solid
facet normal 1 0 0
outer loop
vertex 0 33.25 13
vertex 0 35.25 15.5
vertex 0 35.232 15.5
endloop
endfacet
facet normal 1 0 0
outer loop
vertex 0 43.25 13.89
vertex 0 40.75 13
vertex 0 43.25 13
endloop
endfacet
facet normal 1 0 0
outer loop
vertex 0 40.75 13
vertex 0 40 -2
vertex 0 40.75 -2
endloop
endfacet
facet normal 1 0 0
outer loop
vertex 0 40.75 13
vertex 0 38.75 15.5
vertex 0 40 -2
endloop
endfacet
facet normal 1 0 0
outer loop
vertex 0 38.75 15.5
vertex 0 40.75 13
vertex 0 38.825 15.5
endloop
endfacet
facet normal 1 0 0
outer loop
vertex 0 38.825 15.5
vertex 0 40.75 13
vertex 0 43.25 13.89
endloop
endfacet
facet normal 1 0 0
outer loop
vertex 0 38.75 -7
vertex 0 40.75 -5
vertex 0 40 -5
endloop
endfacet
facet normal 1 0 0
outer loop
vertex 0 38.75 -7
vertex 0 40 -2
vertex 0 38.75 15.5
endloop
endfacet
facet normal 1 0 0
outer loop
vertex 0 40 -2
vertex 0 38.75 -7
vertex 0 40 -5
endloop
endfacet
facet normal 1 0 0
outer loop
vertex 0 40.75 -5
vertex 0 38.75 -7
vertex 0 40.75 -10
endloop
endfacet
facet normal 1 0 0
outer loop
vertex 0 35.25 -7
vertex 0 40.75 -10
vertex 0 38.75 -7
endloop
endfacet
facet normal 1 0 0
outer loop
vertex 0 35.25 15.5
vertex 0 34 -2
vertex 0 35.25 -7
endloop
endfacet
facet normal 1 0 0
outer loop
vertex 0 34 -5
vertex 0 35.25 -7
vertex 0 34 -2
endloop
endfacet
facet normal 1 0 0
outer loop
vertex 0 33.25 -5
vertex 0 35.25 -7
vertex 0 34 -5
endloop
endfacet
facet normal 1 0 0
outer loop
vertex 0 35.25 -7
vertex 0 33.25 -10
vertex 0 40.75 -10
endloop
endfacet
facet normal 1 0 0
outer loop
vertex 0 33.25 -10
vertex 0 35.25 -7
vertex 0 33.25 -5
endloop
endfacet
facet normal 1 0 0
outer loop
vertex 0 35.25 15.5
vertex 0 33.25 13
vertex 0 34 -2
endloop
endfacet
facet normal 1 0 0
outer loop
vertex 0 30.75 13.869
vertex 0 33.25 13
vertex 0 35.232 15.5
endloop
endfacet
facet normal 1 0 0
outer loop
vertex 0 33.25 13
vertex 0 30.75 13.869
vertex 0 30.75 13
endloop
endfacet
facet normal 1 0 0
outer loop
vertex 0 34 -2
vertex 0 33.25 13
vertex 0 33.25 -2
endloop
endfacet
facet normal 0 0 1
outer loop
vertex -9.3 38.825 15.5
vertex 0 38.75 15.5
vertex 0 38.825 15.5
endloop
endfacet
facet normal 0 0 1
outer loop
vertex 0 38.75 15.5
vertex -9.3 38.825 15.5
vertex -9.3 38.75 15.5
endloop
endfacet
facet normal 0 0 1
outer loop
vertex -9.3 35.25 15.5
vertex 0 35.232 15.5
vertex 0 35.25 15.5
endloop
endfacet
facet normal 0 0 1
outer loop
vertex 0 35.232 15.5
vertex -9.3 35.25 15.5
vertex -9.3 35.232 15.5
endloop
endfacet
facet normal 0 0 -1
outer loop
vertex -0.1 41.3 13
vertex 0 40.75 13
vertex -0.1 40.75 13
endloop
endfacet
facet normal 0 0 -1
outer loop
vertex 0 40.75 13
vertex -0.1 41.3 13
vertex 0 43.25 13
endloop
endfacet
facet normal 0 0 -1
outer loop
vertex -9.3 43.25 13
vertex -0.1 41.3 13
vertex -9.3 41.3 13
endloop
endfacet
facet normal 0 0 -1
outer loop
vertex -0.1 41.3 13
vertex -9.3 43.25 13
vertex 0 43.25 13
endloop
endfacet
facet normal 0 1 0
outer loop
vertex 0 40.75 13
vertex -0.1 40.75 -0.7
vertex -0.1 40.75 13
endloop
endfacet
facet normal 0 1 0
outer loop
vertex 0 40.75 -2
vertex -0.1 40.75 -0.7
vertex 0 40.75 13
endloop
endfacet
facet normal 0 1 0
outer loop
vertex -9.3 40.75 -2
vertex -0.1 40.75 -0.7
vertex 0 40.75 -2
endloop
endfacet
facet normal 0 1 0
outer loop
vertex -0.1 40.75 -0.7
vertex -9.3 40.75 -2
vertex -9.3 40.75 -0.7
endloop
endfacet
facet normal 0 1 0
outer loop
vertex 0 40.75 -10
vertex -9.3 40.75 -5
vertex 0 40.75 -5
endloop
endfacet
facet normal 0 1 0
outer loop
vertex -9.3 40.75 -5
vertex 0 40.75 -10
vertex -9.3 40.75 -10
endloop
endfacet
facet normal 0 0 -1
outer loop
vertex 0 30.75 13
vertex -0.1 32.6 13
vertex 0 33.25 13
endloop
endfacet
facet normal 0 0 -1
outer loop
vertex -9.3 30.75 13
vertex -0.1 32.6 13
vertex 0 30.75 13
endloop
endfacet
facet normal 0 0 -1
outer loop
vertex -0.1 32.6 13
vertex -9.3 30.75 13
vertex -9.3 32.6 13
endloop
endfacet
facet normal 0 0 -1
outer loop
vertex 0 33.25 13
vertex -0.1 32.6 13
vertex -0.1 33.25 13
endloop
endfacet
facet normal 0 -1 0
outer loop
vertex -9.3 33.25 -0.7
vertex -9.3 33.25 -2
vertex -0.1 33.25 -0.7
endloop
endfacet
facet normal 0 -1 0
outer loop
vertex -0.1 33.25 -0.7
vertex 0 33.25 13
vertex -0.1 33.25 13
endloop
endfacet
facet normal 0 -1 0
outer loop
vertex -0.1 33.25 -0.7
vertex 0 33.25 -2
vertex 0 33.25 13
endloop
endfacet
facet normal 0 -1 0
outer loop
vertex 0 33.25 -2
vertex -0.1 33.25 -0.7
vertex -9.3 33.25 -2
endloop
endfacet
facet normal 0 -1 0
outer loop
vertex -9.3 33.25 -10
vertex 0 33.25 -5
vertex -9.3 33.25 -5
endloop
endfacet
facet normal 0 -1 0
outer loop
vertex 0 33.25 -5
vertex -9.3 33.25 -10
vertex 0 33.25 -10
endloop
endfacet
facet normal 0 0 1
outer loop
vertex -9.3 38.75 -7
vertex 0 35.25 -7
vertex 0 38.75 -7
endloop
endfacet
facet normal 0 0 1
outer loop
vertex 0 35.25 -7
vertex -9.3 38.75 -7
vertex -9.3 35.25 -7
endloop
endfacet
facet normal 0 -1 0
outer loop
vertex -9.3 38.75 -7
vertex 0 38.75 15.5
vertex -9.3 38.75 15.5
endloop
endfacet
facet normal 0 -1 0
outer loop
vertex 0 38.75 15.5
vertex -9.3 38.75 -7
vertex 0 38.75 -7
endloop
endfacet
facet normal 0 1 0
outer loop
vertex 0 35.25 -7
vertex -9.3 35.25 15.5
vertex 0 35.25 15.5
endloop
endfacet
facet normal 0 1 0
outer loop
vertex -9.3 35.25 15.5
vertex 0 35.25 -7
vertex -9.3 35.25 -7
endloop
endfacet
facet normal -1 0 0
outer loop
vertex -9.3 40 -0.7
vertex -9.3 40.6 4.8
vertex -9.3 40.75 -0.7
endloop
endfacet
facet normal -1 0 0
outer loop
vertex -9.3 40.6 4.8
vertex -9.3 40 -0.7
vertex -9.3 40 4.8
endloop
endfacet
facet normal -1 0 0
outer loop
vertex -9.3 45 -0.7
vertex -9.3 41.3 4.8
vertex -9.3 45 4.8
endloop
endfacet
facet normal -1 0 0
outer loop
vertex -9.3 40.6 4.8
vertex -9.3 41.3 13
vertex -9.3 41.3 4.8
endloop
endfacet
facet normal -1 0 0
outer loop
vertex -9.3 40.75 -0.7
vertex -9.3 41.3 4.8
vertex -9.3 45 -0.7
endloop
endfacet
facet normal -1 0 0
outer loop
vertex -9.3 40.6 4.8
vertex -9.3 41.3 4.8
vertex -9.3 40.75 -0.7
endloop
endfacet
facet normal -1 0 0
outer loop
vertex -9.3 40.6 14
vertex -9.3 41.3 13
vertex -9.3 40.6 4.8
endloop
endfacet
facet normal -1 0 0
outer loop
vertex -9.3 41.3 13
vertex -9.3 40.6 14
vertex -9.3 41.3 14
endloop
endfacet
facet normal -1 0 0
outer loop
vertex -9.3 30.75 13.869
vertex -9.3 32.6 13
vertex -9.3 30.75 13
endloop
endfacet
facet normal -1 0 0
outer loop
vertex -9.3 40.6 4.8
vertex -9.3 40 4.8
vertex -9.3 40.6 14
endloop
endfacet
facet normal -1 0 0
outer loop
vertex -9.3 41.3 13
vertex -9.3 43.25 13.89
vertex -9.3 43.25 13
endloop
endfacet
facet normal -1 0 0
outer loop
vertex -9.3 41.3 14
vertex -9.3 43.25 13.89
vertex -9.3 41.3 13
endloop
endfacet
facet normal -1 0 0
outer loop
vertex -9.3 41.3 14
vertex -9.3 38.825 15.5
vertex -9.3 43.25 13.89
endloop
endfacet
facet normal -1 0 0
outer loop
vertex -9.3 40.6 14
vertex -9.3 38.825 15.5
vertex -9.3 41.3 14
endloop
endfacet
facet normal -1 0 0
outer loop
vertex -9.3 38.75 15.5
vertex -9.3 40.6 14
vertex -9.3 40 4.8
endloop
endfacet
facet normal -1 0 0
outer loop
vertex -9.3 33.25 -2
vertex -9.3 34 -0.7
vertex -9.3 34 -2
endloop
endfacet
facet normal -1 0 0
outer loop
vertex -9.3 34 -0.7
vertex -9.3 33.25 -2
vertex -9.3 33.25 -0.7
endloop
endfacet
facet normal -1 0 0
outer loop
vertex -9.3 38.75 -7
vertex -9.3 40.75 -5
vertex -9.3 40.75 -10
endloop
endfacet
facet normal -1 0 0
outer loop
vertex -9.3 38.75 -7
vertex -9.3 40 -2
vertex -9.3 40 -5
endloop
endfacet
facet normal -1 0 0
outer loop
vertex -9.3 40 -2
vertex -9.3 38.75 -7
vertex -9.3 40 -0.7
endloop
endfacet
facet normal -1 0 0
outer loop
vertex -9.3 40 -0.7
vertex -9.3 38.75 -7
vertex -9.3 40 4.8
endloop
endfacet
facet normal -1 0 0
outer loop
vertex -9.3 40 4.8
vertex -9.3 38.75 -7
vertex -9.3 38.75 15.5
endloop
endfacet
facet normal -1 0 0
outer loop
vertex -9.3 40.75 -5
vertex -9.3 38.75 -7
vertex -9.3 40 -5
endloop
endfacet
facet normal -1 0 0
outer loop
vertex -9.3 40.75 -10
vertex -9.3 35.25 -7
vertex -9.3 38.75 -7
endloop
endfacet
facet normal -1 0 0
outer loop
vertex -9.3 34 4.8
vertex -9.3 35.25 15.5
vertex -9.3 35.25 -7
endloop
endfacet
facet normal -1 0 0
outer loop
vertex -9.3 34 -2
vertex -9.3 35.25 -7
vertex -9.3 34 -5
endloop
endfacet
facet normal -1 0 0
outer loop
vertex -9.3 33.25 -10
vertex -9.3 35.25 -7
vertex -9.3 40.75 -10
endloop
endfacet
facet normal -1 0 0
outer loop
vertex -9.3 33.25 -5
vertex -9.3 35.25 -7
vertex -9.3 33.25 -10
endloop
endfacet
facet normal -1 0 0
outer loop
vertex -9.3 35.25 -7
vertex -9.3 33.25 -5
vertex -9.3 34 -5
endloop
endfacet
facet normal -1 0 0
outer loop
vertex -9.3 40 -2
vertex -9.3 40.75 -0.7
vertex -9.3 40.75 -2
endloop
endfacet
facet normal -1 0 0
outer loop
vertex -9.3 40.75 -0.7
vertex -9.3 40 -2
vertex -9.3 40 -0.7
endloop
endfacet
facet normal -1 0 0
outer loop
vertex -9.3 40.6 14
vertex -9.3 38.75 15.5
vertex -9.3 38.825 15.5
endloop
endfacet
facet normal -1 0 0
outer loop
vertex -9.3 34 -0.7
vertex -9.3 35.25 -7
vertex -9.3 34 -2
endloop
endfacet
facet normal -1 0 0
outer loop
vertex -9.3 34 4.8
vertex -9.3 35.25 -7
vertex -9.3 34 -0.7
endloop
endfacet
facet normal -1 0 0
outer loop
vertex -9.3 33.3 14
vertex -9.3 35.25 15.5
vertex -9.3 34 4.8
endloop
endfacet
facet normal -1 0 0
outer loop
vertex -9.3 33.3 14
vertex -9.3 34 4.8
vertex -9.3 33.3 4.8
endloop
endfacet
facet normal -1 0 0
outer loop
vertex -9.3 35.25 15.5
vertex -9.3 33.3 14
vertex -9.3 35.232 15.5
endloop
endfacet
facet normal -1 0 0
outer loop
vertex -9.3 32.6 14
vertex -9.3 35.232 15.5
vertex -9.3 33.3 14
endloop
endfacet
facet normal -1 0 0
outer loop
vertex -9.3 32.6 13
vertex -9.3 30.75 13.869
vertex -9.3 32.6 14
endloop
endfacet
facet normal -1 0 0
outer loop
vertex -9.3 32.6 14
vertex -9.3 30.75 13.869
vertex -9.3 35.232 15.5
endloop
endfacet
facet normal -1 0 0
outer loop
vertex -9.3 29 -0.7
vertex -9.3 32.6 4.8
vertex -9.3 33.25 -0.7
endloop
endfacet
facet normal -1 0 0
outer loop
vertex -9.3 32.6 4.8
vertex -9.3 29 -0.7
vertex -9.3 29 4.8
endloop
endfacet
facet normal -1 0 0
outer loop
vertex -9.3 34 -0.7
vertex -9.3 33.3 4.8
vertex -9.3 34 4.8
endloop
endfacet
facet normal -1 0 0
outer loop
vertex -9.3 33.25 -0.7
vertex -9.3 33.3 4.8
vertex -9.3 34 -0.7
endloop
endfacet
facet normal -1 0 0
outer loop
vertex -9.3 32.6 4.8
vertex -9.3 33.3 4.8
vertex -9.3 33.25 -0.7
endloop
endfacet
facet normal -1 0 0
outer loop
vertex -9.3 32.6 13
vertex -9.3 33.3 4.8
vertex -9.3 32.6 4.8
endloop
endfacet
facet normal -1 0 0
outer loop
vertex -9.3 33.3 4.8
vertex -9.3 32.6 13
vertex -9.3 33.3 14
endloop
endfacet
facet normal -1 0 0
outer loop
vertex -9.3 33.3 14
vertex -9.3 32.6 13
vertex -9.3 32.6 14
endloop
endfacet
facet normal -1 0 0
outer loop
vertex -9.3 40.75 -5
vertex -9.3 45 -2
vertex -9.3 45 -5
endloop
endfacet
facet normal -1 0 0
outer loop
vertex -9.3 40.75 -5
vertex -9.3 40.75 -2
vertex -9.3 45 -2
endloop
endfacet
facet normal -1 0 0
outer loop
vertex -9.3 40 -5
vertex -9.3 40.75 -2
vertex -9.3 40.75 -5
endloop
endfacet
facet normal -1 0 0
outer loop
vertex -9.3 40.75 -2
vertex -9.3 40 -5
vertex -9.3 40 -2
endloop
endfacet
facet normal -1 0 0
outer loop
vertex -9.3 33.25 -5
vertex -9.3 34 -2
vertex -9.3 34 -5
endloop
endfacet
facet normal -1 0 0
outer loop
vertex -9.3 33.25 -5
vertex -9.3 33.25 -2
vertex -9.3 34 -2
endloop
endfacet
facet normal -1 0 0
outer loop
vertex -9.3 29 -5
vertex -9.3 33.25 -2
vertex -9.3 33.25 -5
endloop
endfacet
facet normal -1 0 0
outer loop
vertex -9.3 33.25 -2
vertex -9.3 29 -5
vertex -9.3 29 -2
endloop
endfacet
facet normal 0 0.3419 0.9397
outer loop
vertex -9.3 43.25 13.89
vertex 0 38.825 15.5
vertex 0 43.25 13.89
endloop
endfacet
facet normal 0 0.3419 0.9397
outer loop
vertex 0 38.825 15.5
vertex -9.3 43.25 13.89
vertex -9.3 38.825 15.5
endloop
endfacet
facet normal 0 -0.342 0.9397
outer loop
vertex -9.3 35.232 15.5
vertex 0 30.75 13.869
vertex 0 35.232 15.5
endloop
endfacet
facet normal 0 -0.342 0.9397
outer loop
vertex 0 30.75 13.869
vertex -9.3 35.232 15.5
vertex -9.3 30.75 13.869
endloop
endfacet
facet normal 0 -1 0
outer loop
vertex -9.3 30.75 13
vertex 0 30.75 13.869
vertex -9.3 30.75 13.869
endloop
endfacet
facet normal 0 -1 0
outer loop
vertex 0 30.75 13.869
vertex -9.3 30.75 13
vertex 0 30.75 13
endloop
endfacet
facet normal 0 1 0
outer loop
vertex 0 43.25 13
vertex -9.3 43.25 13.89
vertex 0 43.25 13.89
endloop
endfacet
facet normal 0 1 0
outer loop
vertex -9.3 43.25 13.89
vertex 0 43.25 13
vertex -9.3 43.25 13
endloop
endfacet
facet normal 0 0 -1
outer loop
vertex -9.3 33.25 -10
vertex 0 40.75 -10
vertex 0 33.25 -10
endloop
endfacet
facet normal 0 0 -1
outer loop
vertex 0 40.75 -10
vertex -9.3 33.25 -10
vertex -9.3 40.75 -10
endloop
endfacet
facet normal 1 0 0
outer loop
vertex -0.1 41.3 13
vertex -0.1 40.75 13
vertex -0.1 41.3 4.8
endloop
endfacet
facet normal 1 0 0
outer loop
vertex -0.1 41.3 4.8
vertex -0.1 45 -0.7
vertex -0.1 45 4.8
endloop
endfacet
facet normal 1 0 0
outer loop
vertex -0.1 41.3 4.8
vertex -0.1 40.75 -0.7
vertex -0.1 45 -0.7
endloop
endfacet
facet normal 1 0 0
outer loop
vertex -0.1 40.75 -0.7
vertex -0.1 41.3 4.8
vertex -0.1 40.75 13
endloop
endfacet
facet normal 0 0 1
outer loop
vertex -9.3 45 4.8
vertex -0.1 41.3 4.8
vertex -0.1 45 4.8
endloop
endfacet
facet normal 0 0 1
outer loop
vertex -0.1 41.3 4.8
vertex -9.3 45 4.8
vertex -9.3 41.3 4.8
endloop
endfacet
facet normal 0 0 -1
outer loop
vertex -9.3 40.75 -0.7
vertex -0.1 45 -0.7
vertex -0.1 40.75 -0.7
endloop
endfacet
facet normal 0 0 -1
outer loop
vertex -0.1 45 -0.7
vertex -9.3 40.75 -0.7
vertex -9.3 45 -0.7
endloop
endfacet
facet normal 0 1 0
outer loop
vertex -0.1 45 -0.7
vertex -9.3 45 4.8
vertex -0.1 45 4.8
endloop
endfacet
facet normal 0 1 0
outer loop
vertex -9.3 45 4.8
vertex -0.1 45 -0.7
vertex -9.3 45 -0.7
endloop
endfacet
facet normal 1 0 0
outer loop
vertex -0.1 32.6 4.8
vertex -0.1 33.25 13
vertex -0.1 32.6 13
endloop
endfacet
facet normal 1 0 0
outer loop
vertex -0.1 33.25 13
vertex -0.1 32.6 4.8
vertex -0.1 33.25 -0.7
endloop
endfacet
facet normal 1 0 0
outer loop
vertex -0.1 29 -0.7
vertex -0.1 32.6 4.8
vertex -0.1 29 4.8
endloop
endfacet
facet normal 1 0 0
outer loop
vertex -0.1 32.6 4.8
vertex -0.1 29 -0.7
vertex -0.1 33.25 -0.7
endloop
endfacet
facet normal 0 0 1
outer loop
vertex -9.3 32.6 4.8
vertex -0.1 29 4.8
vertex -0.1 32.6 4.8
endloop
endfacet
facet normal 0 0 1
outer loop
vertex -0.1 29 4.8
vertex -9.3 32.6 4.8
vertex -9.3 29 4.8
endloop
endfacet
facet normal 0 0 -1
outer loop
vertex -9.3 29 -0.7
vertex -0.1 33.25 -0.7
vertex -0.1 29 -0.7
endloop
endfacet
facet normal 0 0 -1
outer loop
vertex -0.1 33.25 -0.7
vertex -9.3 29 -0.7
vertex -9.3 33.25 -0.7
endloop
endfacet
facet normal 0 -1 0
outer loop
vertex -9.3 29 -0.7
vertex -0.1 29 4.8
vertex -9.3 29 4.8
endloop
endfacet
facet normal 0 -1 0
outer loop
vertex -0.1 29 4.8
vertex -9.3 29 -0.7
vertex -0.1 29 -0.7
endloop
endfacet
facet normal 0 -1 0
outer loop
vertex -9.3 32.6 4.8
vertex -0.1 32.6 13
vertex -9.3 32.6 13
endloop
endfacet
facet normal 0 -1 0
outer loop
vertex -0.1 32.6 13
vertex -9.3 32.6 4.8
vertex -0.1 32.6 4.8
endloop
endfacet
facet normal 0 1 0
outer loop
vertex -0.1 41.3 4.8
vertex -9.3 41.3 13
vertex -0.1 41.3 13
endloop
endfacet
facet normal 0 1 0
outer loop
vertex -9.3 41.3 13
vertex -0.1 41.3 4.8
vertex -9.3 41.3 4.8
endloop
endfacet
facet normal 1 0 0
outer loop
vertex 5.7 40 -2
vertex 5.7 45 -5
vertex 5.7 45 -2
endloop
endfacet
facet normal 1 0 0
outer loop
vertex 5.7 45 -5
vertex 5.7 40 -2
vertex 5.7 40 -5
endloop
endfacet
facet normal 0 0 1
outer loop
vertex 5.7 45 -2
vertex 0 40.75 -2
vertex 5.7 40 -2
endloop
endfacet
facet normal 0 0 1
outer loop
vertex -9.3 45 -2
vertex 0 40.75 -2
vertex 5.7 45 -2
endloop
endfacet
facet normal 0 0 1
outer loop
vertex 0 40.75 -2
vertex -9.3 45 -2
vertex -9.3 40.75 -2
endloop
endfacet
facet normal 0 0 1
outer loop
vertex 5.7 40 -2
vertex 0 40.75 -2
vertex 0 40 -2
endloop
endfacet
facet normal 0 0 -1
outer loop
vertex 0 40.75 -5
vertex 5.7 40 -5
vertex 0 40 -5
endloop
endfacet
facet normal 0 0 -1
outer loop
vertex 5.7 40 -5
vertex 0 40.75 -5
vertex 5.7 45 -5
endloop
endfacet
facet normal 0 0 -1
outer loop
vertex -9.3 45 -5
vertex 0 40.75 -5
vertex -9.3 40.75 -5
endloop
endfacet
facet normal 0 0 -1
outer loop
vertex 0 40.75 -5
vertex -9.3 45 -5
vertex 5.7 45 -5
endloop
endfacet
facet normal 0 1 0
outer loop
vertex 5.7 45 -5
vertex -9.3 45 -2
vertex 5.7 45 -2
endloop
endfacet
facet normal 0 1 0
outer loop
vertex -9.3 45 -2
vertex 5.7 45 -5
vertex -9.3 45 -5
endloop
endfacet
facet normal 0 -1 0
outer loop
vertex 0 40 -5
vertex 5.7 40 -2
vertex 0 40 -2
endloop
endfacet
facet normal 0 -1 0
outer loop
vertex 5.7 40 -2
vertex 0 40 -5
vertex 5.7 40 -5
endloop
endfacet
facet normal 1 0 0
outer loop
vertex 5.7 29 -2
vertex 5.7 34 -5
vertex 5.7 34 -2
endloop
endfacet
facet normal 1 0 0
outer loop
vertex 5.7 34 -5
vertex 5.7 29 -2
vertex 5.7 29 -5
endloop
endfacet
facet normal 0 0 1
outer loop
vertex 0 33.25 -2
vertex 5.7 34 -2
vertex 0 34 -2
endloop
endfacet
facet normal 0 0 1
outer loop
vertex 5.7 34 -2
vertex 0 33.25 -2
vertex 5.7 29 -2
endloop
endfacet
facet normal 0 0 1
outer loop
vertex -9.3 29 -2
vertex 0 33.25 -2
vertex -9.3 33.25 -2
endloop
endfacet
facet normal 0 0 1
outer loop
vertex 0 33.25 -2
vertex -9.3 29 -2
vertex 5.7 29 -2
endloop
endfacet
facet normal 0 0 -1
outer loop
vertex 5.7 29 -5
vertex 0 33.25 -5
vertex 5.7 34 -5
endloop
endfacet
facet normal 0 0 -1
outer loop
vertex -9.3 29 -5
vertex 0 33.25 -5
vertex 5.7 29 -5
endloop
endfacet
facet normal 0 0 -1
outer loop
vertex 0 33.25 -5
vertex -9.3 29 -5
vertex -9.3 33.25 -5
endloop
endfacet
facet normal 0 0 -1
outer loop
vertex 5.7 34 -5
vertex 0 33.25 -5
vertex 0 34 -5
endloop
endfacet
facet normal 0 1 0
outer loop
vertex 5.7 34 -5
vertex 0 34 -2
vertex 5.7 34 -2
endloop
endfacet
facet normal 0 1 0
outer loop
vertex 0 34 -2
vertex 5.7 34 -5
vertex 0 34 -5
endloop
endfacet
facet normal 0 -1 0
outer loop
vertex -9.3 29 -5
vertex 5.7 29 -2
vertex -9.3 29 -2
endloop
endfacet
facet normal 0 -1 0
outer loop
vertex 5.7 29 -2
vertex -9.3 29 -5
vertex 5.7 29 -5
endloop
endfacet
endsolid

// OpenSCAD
Height=15;
Armlength=5;

translate([40,-0.25,-32])difference(){
translate([-50,27,12.5])cube([10,20,35]);
translate([-50,41,10])cube([10,8,35]);
translate([-50,25.5,10])cube([10,8,35]);
translate([-50,35.5,25])cube([10,3.5,35]);
translate([-50,41.3,25])cube([5,3.5,20]);
translate([-50,45,30])cube([15,3.5,20]);
translate([-50,26,30])cube([15,3.5,20]);
translate([-54.3,28,10])cube([5,20,53]);
rotate([0,20,90])translate([20,35.5,58])cube([20,20,20]);
rotate([0,70,90])translate([-52.5,35.5,35])cube([20,20,20]);
translate([-55,11,30])cube([20,20,20]);
translate([-55,43.5,30])cube([20,20,20]);
translate([-50,27,2])cube([20,20,20]);
}


translate([-9.3,40,-.7])cube([9.2,5,5.5]);
translate([-9.3,29,-.7])cube([9.2,5,5.5]);
translate([-9.3,32.6,4])cube([9.2,.7,10]);
translate([-9.3,40.6,4])cube([9.2,.7,10]);

translate([-9.3,40,Height*-1+10])cube([Armlength+10,5,3]);
translate([-9.3,29,Height*-1+10])cube([Armlength+10,5,3]);
